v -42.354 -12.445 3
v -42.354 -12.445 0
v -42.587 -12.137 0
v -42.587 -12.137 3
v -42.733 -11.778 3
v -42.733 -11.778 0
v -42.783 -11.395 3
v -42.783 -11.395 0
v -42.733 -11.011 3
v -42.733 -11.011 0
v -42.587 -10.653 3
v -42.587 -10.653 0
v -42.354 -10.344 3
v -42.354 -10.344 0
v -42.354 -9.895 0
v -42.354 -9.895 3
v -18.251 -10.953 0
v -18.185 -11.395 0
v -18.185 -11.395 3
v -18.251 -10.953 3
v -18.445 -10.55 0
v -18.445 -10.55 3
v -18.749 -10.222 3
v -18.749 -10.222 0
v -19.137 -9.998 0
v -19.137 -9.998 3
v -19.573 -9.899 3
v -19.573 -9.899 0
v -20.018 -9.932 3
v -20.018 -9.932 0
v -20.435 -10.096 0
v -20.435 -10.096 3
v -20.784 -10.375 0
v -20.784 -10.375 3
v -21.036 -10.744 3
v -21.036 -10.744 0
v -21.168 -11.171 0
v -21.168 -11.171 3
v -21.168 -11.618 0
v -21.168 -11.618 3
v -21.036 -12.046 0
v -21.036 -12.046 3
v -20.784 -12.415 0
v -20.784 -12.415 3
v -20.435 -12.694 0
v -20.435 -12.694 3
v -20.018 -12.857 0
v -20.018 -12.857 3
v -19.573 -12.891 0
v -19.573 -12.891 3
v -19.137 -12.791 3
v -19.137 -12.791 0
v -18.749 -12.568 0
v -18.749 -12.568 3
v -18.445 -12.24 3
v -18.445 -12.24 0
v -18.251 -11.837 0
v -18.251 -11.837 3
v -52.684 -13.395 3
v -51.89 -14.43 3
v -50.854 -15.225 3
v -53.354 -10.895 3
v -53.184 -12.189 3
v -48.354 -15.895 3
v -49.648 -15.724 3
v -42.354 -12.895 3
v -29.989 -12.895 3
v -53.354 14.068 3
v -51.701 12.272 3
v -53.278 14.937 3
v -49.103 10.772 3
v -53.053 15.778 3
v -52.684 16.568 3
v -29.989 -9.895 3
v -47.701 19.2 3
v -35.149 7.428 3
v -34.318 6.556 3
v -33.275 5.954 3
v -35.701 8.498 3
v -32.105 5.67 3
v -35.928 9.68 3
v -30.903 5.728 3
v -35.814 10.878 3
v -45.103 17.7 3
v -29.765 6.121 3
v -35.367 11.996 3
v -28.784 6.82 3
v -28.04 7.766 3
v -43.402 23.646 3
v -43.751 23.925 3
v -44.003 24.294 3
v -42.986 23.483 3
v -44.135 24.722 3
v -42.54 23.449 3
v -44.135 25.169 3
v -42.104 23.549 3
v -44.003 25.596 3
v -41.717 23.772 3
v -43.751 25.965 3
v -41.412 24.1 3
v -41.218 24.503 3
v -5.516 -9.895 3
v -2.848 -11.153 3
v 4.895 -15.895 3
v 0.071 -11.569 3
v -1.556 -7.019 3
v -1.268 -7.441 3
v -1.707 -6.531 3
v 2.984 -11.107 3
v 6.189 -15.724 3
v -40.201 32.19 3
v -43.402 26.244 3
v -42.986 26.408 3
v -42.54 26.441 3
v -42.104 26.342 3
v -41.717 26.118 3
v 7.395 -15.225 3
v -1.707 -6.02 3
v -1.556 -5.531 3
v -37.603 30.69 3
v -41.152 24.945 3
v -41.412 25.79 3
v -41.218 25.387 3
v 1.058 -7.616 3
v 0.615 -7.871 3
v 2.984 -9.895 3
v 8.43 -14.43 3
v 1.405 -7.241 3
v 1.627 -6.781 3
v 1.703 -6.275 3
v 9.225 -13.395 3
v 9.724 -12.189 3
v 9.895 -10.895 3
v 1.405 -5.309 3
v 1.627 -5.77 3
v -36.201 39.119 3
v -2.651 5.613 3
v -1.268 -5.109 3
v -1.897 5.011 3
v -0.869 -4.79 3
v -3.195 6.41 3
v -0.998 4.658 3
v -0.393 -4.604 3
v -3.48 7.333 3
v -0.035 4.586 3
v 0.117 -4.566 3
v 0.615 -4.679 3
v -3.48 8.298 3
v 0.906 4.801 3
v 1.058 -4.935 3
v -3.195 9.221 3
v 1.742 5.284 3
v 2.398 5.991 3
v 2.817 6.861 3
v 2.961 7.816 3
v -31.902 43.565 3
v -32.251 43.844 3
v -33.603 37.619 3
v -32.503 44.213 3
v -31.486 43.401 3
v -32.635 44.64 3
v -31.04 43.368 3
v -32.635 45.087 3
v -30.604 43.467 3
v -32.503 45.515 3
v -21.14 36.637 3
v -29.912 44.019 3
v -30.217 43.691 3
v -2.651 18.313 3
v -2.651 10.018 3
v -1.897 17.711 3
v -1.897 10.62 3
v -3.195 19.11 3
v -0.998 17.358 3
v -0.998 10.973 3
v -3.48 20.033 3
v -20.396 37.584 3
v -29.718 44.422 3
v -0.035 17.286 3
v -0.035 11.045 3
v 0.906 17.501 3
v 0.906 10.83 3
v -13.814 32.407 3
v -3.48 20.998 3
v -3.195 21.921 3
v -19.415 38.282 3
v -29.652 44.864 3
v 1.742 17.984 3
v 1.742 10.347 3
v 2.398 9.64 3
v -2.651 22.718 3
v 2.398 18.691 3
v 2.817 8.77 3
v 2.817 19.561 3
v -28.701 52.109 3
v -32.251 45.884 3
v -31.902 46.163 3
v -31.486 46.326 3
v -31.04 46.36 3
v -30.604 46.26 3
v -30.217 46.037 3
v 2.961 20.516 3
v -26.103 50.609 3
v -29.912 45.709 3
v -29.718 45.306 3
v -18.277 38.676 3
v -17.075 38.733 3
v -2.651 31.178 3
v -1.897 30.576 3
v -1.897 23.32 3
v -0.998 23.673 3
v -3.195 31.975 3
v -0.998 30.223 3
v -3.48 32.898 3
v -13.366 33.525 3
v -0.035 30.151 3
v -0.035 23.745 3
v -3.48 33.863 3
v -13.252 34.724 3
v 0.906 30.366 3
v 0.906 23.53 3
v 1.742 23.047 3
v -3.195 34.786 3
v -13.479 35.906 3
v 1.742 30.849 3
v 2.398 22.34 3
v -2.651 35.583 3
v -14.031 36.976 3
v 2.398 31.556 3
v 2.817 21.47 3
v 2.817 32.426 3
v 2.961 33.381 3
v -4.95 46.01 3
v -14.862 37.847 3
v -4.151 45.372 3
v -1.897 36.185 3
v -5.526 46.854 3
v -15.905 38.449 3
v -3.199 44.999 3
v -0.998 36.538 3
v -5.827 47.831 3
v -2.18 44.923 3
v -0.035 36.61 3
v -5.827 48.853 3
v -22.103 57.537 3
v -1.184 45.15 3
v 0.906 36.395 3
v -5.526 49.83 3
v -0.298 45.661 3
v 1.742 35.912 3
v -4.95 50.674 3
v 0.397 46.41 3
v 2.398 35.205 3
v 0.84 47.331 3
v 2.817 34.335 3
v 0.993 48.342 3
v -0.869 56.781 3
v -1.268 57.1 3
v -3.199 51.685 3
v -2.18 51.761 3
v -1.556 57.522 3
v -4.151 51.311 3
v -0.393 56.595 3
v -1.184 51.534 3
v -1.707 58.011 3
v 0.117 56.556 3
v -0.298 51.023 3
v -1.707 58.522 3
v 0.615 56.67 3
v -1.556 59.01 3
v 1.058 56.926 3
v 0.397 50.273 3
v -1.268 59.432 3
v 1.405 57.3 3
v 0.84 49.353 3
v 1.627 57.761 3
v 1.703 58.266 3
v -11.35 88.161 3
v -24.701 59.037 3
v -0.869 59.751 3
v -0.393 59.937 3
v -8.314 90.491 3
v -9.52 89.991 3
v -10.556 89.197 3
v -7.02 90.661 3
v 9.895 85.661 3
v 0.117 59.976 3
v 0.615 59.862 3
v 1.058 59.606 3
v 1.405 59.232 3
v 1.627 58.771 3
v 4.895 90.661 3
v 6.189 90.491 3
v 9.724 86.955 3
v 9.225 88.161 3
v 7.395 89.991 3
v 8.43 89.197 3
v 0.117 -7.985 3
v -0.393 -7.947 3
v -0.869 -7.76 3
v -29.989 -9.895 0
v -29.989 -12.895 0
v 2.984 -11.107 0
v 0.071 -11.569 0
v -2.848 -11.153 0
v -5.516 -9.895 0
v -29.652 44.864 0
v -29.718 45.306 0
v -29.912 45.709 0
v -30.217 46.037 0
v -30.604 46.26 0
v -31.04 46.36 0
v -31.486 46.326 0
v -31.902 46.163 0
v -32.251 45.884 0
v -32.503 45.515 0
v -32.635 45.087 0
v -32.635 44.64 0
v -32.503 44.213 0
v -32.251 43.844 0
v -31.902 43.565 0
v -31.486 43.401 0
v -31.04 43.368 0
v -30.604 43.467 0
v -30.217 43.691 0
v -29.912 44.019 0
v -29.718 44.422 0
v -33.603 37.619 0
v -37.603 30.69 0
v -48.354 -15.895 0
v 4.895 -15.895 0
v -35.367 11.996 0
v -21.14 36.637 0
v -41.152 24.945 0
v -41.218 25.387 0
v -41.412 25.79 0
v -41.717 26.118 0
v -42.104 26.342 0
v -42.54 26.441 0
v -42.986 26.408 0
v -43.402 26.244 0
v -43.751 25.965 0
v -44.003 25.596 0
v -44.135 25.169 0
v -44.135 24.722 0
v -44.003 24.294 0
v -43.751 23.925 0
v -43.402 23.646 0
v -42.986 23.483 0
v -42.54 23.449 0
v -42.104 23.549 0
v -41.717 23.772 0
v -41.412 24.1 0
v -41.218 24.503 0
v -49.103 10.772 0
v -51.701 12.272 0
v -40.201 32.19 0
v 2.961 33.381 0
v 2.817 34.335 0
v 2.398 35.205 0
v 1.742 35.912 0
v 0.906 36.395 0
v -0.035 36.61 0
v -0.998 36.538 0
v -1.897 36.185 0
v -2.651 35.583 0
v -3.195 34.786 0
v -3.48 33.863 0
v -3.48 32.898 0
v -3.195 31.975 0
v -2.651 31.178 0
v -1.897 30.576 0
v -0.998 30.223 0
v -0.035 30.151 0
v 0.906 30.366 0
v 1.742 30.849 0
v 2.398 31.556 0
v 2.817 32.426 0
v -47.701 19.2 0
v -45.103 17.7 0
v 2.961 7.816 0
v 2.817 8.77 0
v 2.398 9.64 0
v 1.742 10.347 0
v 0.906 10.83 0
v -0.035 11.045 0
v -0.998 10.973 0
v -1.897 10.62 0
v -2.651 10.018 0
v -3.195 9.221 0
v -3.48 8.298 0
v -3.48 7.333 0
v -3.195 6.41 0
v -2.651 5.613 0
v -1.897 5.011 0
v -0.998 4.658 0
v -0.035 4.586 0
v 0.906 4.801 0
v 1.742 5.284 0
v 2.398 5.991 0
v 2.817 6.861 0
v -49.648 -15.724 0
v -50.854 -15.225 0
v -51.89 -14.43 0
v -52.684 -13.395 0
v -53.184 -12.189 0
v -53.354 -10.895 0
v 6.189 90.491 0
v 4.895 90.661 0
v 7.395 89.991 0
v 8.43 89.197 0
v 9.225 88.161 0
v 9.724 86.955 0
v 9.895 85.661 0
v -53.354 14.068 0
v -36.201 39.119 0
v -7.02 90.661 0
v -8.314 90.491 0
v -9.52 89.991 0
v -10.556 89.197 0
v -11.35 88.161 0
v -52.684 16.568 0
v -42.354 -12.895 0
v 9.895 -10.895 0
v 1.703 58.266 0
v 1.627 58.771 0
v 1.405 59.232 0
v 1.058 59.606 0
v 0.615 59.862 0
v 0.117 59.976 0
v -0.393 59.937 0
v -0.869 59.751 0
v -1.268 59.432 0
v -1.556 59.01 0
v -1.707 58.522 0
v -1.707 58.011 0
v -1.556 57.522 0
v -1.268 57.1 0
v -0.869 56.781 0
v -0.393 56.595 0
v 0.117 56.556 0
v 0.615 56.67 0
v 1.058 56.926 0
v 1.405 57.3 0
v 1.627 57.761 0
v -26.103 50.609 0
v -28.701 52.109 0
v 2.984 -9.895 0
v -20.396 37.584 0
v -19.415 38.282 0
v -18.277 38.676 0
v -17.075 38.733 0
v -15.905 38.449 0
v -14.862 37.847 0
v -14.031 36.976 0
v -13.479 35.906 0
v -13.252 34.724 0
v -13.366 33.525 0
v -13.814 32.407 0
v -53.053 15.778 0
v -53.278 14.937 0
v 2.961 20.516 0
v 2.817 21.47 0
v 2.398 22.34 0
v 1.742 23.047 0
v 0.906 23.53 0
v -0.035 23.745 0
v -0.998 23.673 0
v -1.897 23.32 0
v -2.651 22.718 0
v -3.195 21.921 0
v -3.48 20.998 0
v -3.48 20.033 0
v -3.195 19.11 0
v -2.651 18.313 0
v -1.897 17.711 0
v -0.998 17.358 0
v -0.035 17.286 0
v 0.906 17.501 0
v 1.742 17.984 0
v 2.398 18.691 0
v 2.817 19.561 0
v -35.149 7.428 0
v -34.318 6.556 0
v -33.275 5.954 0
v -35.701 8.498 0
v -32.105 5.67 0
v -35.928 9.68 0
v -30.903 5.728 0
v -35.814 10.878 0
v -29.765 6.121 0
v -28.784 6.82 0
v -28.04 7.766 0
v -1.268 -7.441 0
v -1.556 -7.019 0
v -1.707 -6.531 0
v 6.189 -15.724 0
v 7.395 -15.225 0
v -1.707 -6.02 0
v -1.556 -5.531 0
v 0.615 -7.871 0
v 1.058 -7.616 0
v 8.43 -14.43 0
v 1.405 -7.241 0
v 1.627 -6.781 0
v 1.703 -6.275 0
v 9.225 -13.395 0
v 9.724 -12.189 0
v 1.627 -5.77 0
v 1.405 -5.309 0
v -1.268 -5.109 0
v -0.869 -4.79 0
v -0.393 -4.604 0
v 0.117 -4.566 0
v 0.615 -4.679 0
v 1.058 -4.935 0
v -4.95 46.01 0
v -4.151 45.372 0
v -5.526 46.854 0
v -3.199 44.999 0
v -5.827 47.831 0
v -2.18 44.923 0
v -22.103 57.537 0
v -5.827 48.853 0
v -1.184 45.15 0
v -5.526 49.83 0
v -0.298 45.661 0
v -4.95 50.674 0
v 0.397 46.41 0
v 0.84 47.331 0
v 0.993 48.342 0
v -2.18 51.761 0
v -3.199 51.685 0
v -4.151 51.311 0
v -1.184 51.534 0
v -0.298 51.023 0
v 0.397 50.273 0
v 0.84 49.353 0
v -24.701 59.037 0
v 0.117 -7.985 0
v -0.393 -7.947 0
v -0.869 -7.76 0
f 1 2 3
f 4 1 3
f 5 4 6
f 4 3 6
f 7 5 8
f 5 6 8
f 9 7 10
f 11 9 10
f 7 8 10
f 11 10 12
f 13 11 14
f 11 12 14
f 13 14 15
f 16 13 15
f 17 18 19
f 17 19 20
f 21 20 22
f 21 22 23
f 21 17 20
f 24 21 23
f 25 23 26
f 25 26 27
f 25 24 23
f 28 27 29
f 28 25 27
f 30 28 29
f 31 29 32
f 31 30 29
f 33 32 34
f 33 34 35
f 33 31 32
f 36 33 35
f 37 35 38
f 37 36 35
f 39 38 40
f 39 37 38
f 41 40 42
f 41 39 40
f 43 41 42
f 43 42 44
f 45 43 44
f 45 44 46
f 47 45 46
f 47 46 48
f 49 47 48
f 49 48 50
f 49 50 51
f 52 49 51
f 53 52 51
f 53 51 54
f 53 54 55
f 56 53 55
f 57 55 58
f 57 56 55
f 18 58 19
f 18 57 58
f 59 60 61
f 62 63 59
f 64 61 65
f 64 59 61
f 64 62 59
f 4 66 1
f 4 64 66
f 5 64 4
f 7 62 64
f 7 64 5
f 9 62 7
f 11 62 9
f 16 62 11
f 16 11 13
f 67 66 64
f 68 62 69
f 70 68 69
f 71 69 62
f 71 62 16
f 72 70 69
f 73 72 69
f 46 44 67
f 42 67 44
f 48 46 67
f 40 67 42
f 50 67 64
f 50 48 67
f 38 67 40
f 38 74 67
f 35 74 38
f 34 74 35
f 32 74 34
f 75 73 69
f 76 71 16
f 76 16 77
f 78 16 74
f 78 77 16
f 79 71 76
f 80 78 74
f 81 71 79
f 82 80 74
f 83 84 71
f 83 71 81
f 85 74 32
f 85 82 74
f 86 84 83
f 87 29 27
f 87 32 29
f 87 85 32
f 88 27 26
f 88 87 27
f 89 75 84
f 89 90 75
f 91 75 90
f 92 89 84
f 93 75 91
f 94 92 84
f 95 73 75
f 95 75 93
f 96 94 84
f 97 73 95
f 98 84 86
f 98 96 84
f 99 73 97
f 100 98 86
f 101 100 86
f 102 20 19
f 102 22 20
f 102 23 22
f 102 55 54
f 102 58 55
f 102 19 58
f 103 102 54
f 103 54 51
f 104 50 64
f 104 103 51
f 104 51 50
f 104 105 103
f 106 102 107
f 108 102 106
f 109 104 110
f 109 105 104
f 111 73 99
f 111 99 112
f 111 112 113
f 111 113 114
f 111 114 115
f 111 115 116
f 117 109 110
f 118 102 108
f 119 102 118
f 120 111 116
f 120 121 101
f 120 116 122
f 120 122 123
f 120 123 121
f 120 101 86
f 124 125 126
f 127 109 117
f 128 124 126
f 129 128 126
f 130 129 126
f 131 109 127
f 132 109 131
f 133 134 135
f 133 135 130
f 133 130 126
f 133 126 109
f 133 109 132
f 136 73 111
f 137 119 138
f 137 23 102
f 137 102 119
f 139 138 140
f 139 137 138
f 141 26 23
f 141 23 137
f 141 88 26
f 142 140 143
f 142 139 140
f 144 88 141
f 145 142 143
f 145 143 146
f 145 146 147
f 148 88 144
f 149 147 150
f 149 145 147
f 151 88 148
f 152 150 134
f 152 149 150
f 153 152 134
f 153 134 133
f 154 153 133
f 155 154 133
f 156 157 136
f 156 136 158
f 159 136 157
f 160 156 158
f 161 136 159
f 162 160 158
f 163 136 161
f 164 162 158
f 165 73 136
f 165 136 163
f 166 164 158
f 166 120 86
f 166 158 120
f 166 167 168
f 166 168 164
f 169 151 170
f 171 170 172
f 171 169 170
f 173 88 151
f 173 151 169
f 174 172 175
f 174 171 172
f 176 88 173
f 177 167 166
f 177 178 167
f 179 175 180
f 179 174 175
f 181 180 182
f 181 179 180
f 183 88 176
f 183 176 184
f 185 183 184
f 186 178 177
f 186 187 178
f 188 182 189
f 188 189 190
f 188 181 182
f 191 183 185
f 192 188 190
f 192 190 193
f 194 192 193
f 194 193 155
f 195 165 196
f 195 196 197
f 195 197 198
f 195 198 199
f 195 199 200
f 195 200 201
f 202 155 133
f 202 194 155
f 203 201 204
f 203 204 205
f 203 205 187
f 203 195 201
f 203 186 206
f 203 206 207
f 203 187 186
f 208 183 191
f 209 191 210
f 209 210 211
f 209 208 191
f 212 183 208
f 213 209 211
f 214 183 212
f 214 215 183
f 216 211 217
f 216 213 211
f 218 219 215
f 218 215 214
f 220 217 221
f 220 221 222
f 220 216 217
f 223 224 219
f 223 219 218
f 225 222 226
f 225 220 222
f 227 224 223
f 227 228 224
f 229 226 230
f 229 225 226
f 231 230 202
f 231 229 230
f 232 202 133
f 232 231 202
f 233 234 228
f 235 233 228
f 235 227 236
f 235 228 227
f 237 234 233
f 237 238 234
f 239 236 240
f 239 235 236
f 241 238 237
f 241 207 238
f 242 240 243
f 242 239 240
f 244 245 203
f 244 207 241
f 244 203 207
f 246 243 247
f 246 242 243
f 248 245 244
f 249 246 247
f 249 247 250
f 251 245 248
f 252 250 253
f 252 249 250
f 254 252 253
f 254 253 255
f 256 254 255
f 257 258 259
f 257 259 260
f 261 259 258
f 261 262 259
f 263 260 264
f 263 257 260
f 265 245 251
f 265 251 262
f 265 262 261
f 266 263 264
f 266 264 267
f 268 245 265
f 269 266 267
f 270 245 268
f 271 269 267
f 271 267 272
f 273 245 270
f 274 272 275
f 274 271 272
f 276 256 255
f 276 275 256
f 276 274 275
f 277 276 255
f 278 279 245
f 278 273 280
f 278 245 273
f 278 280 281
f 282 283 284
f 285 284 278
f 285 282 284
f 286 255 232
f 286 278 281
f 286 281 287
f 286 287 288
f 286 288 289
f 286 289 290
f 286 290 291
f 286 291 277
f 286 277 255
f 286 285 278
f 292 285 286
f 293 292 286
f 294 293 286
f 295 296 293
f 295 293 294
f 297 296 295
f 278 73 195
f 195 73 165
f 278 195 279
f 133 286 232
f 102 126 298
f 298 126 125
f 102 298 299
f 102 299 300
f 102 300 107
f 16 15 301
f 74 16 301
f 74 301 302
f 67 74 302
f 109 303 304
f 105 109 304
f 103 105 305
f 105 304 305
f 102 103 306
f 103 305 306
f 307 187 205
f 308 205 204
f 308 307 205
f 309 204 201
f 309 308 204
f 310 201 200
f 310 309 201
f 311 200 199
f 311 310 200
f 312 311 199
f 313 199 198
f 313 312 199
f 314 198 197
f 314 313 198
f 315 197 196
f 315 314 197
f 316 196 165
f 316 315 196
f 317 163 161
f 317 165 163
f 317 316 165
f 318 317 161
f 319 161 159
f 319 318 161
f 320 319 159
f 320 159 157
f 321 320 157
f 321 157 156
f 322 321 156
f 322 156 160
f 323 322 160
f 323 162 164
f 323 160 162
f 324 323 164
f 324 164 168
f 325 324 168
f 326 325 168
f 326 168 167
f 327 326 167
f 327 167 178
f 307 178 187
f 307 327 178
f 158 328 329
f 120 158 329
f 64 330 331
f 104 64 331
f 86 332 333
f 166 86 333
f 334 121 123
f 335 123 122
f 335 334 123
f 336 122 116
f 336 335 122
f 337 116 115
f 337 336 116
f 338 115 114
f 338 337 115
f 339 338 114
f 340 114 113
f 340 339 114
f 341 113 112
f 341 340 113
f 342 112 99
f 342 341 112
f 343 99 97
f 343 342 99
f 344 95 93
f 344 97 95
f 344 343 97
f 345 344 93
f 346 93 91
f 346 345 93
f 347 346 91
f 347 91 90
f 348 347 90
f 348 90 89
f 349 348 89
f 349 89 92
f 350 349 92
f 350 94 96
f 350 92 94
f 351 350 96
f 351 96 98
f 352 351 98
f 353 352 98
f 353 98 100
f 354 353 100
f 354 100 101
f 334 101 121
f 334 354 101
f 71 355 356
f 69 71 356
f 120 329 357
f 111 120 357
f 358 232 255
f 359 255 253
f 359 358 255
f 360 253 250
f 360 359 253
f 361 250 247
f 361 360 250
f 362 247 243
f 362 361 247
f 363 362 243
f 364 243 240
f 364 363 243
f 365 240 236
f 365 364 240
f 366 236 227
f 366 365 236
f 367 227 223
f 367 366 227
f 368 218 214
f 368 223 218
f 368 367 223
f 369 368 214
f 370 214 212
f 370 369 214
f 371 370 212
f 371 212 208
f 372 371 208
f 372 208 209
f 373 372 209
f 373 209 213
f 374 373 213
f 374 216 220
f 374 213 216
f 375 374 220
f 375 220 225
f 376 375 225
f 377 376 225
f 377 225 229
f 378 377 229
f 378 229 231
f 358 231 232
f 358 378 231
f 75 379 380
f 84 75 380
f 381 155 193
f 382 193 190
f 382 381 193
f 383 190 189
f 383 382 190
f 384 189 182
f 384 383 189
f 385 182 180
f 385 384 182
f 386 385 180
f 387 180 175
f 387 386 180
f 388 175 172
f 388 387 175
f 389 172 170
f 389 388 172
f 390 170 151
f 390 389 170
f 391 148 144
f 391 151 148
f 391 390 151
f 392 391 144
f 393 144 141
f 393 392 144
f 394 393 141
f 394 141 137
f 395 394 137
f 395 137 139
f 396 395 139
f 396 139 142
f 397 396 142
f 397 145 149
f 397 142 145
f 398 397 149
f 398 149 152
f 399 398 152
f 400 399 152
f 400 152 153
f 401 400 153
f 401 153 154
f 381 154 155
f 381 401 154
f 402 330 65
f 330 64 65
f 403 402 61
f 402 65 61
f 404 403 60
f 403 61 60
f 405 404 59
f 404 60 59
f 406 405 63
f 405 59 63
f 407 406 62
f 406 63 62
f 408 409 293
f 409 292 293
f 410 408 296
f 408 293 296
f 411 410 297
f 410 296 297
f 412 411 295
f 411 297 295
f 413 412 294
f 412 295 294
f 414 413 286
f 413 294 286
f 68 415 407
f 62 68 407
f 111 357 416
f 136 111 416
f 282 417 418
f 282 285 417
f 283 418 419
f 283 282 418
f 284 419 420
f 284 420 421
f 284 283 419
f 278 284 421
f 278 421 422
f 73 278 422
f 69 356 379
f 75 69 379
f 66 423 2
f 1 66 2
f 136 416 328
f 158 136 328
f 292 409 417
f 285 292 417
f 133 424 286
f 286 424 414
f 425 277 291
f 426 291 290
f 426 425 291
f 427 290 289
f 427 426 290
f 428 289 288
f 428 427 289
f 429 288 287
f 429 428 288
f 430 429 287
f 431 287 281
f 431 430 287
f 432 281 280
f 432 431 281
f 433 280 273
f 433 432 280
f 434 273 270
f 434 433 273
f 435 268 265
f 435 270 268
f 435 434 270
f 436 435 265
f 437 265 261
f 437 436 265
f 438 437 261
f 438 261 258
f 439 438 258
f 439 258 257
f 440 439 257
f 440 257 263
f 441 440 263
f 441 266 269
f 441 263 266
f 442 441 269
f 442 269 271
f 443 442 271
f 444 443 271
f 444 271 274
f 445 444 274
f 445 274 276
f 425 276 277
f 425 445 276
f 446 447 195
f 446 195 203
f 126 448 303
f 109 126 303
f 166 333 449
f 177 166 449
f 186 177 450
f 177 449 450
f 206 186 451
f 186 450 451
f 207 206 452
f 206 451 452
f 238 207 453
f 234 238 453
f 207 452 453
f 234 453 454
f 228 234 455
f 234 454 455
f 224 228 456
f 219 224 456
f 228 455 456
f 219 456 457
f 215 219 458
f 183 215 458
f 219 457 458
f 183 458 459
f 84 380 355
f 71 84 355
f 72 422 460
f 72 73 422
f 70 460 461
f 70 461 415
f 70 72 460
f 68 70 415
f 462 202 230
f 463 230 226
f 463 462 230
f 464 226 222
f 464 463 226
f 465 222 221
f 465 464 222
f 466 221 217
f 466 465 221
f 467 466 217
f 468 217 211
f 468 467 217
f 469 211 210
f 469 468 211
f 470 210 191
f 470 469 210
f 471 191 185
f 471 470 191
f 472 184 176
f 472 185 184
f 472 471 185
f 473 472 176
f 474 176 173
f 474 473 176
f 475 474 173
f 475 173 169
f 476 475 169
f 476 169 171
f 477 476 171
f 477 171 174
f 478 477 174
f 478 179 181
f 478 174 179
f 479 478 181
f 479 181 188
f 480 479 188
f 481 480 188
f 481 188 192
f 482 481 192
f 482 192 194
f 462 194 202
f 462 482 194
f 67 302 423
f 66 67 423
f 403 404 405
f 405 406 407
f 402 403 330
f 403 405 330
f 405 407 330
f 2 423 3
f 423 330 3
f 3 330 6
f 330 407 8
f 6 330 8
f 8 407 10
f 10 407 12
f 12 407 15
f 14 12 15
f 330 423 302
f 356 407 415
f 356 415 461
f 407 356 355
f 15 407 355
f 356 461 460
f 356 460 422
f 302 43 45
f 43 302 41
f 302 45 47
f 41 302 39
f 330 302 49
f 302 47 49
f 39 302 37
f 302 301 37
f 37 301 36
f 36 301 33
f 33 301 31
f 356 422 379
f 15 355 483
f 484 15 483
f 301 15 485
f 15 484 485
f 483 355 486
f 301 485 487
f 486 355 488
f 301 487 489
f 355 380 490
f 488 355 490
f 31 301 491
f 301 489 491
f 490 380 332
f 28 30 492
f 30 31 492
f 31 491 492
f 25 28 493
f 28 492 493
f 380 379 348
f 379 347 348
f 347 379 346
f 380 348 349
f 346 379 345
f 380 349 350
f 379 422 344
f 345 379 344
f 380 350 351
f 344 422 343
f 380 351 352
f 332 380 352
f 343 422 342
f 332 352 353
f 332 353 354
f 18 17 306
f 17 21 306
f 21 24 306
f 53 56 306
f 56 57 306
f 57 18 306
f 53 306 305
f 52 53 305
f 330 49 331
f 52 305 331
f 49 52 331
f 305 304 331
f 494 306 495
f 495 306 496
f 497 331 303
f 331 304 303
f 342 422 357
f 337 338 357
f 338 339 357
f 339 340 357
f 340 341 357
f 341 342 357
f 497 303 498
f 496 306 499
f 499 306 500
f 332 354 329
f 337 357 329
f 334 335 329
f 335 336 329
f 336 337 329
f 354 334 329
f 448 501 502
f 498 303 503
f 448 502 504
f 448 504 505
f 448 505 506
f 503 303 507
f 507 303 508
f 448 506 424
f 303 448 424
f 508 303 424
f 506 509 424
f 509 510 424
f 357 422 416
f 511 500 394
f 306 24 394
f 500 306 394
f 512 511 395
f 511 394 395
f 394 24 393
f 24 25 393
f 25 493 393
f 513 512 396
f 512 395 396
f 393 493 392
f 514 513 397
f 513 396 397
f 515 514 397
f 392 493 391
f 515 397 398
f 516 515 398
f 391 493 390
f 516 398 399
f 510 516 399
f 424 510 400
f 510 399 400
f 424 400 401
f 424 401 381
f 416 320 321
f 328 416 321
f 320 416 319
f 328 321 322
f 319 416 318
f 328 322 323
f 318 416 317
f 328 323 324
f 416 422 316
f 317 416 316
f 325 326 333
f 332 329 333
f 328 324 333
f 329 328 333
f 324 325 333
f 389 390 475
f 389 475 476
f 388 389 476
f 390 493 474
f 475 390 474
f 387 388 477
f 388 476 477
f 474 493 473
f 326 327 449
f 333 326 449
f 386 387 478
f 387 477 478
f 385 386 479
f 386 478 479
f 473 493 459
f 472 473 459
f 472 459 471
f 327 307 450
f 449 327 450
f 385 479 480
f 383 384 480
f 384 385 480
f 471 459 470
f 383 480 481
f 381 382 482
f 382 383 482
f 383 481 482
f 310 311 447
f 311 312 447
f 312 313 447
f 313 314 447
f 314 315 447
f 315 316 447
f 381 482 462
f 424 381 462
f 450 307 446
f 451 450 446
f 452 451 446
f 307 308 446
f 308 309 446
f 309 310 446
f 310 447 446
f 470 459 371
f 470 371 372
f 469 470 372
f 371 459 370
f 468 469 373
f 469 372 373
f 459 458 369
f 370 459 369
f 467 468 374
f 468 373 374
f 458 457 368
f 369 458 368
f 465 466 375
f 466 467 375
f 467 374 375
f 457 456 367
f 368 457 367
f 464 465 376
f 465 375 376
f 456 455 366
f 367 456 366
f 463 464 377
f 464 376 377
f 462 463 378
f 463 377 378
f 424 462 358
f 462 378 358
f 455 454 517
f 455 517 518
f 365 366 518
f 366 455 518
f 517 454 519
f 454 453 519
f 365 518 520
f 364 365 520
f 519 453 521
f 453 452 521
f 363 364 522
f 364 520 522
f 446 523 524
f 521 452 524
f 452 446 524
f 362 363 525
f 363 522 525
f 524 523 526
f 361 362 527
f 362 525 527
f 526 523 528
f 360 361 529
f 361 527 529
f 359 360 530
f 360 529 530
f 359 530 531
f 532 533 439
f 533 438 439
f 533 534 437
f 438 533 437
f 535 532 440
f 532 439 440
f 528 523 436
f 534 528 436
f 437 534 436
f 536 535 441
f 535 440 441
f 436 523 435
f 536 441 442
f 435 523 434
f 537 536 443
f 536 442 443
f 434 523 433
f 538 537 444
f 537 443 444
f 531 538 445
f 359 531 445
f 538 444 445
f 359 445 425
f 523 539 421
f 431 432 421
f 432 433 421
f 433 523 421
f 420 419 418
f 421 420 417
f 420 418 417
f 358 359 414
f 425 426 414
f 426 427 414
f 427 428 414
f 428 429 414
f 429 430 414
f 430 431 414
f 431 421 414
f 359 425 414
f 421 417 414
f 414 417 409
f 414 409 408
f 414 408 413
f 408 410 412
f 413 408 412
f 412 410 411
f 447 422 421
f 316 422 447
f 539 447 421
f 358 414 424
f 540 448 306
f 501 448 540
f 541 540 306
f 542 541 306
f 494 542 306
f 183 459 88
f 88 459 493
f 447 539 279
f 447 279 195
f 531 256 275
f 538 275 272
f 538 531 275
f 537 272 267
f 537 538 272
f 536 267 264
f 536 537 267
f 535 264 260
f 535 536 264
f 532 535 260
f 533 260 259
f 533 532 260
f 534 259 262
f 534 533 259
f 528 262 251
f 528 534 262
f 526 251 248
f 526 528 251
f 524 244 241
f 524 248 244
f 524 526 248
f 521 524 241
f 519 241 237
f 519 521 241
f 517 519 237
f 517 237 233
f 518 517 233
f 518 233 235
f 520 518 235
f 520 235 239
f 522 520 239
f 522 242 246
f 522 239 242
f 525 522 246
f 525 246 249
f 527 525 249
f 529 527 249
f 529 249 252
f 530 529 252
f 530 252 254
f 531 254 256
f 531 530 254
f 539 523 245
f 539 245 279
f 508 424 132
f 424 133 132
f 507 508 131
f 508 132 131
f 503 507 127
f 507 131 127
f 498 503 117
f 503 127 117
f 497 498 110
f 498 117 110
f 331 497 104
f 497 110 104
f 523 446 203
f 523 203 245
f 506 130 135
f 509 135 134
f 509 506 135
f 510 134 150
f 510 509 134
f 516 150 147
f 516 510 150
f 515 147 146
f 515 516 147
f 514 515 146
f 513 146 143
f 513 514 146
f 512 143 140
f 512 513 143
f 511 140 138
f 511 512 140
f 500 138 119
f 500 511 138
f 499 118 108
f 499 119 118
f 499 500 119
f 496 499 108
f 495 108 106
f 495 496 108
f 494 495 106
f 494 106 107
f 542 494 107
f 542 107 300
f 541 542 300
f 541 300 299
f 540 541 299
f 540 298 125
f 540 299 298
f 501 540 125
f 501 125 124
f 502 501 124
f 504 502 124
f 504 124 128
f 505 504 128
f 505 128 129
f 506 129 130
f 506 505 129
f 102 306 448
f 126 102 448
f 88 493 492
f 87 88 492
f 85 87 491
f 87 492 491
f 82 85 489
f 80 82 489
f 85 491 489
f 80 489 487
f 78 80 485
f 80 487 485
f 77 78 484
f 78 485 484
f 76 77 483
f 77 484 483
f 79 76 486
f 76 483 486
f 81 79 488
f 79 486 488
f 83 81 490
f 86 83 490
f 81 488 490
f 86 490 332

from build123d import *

# Parameters (mm, degrees)
SKETCH1_R            = 1.5
BOSS_EXTRUDE1_DEPTH  = 3
SKETCH3_R            = 1.7144
SKETCH3_R_2          = 3.2384
SKETCH3_R_3          = 3.4289
SKETCH3_R_4          = 1.714400001
CUT_EXTRUDE4_DEPTH   = 106.238487343
SKETCH4_R            = 1.5
CUT_EXTRUDE5_DEPTH   = 106.238487343
CABLEHOLE_DEPTH      = 106.238487343
CABLEHOLE_DEPTH_BACK = 106.238487343
FILLET1_R            = 5


with BuildPart() as part:
    # Sketch1 → Boss-Extrude1 (new body)
    with BuildSketch(Plane.XY):
        Polygon((9.894788559, 90.661246725), (-9.906811441, 90.661246725), (-53.35426469, 15.408050237), (-53.35426469, -15.894788559), (9.894788559, -15.894788559), align=None)
        with BuildLine():
            Line((2.984475762, -9.894788559), (2.984475762, -11.107284946))
            ThreePointArc((2.984475762, -11.107284946), (-1.404084484, -11.470508377), (-5.516079054, -9.894788559))
            Line((-5.516079054, -9.894788559), (2.984475762, -9.894788559))
        make_face(mode=Mode.SUBTRACT)
        with BuildLine():
            Line((-42.353698644, -10.344103475), (-42.353698644, -9.894788559))
            Line((-42.353698644, -9.894788559), (-29.988741988, -9.894788559))
            Line((-29.988741988, -9.894788559), (-29.988741988, -12.894788559))
            Line((-29.988741988, -12.894788559), (-42.353698644, -12.894788559))
            Line((-42.353698644, -12.894788559), (-42.353698644, -12.445473643))
            ThreePointArc((-42.353698644, -12.445473643), (-42.783156326, -11.394788559), (-42.353698644, -10.344103475))
        make_face(mode=Mode.SUBTRACT)
        with Locations((-19.684611441, -11.394788559)):
            Circle(SKETCH1_R, mode=Mode.SUBTRACT)
    extrude(amount=BOSS_EXTRUDE1_DEPTH)

    # Sketch3 → Cut-Extrude4 (cut, through all)
    with BuildSketch(Plane.XY):
        with Locations((-0.011311441, -6.275188559)):
            Circle(SKETCH3_R)
        with Locations((-0.277311441, 7.815511441)):
            Circle(SKETCH3_R_2)
        with Locations((-0.277311441, 20.515511441)):
            Circle(SKETCH3_R_2)
        with Locations((-0.277311441, 33.380511441)):
            Circle(SKETCH3_R_2)
        with Locations((-2.436311441, 48.341911441)):
            Circle(SKETCH3_R_3)
        with Locations((-0.011311441, 58.266061441)):
            Circle(SKETCH3_R_4)
    extrude(amount=CUT_EXTRUDE4_DEPTH, mode=Mode.SUBTRACT)

    # Sketch4 → Cut-Extrude5 (cut, through all)
    with BuildSketch(Plane.XY):
        with Locations((-42.651822313, 24.9452242)):
            Circle(SKETCH4_R)
        with Locations((-31.151822313, 44.863808487)):
            Circle(SKETCH4_R)
        Polygon((-40.200860419, 32.190414728), (-36.200860419, 39.118617958), (-33.602784207, 37.618617958), (-37.602784207, 30.690414728), align=None)
        Polygon((-24.700860419, 59.037202245), (-28.700860419, 52.108999015), (-26.102784207, 50.608999015), (-22.102784207, 57.537202245), align=None)
        Polygon((-51.700860419, 12.271830441), (-47.700860419, 19.200033671), (-45.102784207, 17.700033671), (-49.102784207, 10.771830441), align=None)
    extrude(amount=CUT_EXTRUDE5_DEPTH, mode=Mode.SUBTRACT)

    # Sketch5 → CableHole (cut, two sides: drawn at the far end of the back side and taken through both)
    with BuildSketch(Plane.XY.offset(3).offset(-CABLEHOLE_DEPTH_BACK)):
        with BuildLine():
            Line((-35.366569483, 11.996089665), (-21.139931787, 36.637348974))
            ThreePointArc((-21.139931787, 36.637348974), (-15.361765759, 38.185603895), (-13.813510838, 32.407437867))
            Line((-13.813510838, 32.407437867), (-28.040148533, 7.766178558))
            ThreePointArc((-28.040148533, 7.766178558), (-33.818314562, 6.217923637), (-35.366569483, 11.996089665))
        make_face()
    extrude(amount=CABLEHOLE_DEPTH + CABLEHOLE_DEPTH_BACK, mode=Mode.SUBTRACT)

    # Fillet1
    fillet1_edges = [part.edges().sort_by_distance(p)[0] for p in [
        (-53.35426469, -15.894788559, 1.5),
        (-53.35426469, 15.408050237, 1.5),
        (-9.906811441, 90.661246725, 1.5),
        (9.894788559, 90.661246725, 1.5),
        (9.894788559, -15.894788559, 1.5),
    ]]
    fillet(fillet1_edges, radius=FILLET1_R)


solid = part.part
